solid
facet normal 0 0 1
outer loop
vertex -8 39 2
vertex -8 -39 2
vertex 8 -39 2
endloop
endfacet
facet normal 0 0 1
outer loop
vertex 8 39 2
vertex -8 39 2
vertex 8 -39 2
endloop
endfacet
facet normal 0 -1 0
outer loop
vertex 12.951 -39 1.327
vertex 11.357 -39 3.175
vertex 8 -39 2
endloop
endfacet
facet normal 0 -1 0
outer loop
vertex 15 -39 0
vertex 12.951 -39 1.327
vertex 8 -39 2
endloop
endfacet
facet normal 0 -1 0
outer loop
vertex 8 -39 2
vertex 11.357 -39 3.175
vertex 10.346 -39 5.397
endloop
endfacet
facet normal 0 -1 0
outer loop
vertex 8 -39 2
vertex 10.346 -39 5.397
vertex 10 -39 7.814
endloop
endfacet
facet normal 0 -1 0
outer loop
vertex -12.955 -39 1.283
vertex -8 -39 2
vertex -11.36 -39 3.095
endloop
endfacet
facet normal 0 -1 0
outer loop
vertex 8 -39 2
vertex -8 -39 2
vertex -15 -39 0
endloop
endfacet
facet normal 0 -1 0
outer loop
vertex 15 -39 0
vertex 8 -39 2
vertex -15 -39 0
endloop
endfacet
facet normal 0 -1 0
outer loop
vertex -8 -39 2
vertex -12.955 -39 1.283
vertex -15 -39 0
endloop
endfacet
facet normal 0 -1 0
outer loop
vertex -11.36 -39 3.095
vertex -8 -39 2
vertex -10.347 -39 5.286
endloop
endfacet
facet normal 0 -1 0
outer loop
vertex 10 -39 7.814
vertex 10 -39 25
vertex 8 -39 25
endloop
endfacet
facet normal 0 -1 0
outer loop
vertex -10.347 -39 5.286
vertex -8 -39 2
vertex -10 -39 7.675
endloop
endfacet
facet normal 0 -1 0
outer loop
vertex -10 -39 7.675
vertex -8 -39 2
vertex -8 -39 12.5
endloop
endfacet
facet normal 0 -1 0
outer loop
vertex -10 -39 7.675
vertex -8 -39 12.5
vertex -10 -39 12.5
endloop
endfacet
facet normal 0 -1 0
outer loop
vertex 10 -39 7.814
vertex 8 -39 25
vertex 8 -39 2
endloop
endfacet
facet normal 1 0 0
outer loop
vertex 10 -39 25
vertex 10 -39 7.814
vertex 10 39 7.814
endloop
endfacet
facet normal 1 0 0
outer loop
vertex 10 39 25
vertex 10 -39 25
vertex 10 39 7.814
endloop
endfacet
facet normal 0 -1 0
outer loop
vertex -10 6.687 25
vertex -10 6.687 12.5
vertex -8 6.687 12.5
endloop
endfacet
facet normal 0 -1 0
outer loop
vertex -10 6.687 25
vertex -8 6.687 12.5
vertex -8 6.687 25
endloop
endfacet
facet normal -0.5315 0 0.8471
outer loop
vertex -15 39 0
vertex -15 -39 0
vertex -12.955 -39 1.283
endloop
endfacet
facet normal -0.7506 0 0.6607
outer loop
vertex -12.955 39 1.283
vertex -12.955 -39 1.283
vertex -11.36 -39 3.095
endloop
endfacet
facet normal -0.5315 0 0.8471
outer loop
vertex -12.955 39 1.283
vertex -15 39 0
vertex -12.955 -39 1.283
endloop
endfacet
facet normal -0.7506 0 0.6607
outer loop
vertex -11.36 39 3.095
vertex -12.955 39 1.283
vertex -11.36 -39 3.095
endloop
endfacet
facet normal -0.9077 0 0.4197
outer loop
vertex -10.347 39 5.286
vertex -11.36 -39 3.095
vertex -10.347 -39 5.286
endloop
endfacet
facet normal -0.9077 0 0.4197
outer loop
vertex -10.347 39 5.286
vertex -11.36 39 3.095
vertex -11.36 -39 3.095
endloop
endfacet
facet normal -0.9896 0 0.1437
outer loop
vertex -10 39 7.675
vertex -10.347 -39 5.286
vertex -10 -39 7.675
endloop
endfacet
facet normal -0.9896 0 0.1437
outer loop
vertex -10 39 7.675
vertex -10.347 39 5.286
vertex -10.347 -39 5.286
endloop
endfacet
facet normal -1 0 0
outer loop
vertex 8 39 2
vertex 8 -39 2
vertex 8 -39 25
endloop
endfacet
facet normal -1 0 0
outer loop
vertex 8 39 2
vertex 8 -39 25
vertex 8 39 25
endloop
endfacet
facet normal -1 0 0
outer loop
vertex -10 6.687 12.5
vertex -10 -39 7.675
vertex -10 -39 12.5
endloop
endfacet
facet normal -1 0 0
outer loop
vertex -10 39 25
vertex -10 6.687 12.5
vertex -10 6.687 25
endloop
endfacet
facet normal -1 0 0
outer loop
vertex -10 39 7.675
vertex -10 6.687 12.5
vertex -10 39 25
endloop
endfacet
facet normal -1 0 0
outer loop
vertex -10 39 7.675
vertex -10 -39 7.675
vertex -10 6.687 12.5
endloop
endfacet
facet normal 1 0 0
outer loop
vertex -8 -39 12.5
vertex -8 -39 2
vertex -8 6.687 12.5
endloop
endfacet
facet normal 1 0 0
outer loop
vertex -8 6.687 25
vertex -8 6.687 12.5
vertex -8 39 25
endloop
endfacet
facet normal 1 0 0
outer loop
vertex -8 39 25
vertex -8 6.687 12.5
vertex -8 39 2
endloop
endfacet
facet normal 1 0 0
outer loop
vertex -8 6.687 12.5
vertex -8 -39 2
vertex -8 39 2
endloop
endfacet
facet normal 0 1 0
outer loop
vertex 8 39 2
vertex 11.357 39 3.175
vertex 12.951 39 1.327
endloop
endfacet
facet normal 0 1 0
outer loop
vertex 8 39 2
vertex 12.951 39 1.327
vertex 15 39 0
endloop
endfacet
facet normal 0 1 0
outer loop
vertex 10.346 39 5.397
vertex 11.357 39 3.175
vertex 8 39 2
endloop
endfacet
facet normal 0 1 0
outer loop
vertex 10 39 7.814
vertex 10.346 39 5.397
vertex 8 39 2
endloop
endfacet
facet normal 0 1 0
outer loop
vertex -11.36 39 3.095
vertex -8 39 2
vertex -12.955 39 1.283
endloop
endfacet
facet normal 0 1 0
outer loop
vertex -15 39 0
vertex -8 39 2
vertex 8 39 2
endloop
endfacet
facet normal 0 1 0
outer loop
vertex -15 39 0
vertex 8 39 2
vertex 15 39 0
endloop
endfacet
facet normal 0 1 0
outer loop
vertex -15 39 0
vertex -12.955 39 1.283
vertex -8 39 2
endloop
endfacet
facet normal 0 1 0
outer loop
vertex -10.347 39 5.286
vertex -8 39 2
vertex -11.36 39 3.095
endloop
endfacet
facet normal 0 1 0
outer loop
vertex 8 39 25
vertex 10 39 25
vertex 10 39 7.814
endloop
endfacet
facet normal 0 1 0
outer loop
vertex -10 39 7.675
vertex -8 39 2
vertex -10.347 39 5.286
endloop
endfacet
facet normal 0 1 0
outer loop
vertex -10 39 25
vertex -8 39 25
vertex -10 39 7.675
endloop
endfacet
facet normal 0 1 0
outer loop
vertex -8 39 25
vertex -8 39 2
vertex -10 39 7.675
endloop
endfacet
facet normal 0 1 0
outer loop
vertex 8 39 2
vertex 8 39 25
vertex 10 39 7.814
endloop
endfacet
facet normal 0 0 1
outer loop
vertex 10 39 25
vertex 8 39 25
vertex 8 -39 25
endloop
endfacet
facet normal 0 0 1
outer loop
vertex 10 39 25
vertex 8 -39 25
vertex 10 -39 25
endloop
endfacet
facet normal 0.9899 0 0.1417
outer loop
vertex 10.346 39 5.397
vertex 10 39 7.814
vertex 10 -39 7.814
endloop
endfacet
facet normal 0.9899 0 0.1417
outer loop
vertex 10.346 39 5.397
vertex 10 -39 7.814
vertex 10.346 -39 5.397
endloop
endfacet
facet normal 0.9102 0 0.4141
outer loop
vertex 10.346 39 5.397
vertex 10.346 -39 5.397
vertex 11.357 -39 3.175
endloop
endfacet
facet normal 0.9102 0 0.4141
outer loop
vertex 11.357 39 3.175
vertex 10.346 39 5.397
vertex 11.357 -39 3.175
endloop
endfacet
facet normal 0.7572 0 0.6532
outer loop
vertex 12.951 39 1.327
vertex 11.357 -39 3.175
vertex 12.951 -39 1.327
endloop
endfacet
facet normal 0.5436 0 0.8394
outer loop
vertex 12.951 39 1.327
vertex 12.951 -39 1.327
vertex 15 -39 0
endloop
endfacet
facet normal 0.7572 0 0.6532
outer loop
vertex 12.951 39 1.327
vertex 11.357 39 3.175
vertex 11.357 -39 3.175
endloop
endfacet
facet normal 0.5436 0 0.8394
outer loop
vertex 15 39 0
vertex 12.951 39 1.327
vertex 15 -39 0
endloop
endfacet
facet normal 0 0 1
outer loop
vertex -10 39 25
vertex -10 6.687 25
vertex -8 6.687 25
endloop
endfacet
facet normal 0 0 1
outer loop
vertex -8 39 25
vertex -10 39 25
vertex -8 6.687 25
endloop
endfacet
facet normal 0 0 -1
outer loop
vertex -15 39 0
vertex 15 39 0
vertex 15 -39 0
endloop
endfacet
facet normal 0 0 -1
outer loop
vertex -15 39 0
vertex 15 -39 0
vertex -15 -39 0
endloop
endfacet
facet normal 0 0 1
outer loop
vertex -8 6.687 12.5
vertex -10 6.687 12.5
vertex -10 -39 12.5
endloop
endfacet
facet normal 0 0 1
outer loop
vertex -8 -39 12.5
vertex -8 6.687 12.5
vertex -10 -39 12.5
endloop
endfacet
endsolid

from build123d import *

# Parameters (mm, degrees)
F0_W     = 2
F0_H     = 78
F1_DEPTH = 25
F0_W_2   = 16
F2_DEPTH = 2
F3_W     = 45.6874087788
F3_H     = 12.5
F4_DEPTH = 10
F7_DEPTH = 78
F8_DEPTH = 78


# Not quite as in the source:
# - a feature names something its author has since deleted; it is built from what else it names


with BuildPart() as f1:
    # F0 (on Top) → F1 (new body)
    with BuildSketch(Plane.XY):
        with Locations((9, 0)):
            Rectangle(F0_W, F0_H)
    extrude(amount=F1_DEPTH)



with BuildPart() as f1b:
    # F0 (on Top) → F1, piece 2 (new body)
    with BuildSketch(Plane.XY):
        with Locations((-9, 0)):
            Rectangle(F0_W, F0_H)
    extrude(amount=F1_DEPTH)


with BuildPart() as f1_1:
    add(f1.part)

    add(f1b.part)  # F2 merges F1b
    # F0 (on Top) → F2 (join)
    with BuildSketch(Plane.XY):
        with Locations((9, 0)):
            Rectangle(F0_W, F0_H)
        Rectangle(F0_W_2, F0_H)
        with Locations((-9, 0)):
            Rectangle(F0_W, F0_H)
    extrude(amount=F2_DEPTH)

    # F3 (on face) → F4 (cut)
    with BuildSketch(Plane(origin=(-10, 0, 0), x_dir=(0, -1, 0), z_dir=(-1, 0, 0))):
        with Locations((16.1562956106, 18.75)):
            Rectangle(F3_W, F3_H)
    extrude(amount=-F4_DEPTH, mode=Mode.SUBTRACT)

    # F6 (on face) → F7 (join)
    with BuildSketch(Plane(origin=(0, 39, 0), x_dir=(-1, 0, 0), z_dir=(0, 1, 0))):
        with BuildLine():
            ThreePointArc((-10, 7.8135579824), (-11.356996059, 3.1753555196), (-15, 0))
            Line((-15, 0), (-10, 0))
            Line((-10, 0), (-10, 7.8135579824))
        make_face()
    extrude(amount=-F7_DEPTH)

    # F5 (on face) → F8 (join)
    with BuildSketch(Plane(origin=(0, 39, 0), x_dir=(-1, 0, 0), z_dir=(0, 1, 0))):
        with BuildLine():
            Line((10, 0), (15, 0))
            ThreePointArc((15, 0), (11.360255444, 3.0951443467), (10, 7.6752495952))
            Line((10, 7.6752495952), (10, 0))
        make_face()
    extrude(amount=-F8_DEPTH)


solid = f1_1.part
